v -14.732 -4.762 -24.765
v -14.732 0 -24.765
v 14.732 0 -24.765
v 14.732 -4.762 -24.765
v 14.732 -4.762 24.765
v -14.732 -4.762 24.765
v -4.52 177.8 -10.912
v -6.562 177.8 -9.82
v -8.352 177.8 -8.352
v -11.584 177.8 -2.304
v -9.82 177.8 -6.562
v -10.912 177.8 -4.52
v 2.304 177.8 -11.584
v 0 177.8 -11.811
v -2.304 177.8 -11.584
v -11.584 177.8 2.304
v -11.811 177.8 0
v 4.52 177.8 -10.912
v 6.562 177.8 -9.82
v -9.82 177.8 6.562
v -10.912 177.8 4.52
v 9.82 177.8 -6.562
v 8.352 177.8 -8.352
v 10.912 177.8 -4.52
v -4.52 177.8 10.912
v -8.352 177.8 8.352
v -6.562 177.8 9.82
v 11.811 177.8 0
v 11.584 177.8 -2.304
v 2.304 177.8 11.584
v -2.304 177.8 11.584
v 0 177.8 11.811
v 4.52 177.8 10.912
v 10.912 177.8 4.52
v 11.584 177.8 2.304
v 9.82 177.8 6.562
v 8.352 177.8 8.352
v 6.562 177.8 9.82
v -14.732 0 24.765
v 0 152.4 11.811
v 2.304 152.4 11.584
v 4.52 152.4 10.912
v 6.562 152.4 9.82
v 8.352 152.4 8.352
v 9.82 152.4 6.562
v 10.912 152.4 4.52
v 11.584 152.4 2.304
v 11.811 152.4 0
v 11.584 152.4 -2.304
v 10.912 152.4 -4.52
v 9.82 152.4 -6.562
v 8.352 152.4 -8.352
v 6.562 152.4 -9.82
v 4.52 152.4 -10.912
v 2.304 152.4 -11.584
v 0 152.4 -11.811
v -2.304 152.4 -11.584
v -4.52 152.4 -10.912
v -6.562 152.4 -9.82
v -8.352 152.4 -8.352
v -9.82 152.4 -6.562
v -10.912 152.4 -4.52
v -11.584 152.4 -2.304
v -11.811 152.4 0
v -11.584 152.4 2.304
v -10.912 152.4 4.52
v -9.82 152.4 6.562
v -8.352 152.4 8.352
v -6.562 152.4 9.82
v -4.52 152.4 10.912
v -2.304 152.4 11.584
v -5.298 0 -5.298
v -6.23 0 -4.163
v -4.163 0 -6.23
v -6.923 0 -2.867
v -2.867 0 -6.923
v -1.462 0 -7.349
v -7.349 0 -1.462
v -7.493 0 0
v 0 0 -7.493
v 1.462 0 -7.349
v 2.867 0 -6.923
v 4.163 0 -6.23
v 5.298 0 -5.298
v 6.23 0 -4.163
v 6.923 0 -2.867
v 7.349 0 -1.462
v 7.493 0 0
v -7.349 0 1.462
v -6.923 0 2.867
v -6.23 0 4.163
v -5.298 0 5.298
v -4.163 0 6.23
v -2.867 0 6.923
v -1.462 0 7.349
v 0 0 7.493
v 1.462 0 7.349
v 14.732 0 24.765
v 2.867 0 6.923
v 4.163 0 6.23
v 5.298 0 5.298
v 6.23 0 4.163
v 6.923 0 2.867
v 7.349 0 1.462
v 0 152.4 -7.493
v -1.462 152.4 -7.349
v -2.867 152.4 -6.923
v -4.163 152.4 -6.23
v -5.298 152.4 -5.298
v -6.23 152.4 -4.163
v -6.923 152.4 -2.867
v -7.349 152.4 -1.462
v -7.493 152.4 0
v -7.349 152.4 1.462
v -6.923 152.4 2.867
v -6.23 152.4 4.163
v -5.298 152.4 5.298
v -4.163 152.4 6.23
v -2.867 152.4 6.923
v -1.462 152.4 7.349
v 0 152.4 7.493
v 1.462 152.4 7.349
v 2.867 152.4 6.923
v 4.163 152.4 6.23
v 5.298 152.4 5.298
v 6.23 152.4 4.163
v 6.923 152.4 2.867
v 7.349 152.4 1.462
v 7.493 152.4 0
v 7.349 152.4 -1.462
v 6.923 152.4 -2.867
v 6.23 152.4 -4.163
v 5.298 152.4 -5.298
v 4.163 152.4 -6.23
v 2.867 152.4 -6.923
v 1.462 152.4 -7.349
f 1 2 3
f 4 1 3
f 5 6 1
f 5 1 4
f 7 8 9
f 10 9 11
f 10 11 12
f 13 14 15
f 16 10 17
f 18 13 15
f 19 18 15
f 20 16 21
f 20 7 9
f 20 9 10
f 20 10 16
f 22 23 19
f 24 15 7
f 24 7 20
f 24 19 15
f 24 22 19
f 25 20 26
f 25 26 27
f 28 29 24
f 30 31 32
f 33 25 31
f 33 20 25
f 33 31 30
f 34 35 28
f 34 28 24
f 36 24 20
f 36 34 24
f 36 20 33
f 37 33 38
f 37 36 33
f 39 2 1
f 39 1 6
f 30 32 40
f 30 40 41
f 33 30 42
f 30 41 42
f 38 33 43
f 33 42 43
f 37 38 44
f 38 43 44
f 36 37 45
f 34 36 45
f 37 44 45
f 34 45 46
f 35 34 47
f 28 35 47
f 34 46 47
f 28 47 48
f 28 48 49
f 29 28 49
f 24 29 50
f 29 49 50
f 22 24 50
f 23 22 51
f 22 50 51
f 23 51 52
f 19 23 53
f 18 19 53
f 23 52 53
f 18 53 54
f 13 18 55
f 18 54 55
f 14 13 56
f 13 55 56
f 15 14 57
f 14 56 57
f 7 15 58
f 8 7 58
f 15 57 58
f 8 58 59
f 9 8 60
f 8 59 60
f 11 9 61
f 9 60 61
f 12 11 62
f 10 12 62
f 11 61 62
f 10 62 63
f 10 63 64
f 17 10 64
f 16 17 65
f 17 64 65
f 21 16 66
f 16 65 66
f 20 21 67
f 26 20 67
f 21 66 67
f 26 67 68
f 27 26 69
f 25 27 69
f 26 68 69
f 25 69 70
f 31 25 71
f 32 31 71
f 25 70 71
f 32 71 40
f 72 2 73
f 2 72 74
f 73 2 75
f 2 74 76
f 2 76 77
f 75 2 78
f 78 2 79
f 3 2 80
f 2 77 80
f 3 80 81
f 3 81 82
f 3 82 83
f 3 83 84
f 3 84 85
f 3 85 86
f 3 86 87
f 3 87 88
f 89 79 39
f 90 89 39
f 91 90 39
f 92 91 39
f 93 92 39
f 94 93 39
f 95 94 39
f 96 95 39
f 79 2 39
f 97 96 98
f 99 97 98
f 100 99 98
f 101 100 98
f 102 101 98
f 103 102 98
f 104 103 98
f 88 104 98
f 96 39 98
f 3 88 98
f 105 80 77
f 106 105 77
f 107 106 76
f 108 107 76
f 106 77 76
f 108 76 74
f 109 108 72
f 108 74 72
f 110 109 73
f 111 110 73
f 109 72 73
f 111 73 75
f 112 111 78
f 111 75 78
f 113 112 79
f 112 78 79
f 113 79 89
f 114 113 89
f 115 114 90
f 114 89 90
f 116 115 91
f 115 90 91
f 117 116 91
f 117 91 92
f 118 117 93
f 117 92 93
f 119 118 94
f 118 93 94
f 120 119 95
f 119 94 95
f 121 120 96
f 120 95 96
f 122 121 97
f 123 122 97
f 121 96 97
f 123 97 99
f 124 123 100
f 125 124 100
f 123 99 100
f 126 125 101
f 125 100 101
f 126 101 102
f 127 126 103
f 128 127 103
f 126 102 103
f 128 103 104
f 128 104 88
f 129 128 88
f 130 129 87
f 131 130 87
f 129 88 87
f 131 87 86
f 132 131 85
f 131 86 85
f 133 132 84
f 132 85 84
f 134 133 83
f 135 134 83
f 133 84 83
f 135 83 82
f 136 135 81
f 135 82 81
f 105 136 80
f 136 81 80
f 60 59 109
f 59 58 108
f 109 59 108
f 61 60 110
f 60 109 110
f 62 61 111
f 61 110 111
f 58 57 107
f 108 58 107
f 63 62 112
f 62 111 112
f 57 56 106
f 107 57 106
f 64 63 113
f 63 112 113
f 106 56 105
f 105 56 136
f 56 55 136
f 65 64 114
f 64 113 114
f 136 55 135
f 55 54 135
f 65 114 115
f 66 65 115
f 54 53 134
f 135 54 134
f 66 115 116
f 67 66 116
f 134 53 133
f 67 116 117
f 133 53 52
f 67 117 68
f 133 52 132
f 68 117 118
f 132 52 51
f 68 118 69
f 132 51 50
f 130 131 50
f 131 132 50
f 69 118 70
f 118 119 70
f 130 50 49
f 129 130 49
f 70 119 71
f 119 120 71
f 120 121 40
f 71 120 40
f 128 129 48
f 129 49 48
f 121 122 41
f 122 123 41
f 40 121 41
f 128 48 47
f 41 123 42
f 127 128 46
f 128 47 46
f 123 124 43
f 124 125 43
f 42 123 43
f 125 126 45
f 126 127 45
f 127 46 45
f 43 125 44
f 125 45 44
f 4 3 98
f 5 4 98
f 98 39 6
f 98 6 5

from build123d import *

# Parameters (mm, degrees)
SKETCH1_R           = 7.493
BOSS_EXTRUDE1_DEPTH = 152.4
SKETCH2_W           = 29.464
SKETCH2_H           = 49.53
BOSS_EXTRUDE2_DEPTH = 4.7625
SKETCH3_R           = 11.811
BOSS_EXTRUDE3_DEPTH = 25.4


with BuildPart() as part:
    # Sketch1 → Boss-Extrude1 (new body)
    with BuildSketch(Plane(origin=(0, 0, 0), x_dir=(1, 0, 0), z_dir=(0, 1, 0))):
        with Locations(Location((0, 0, 0), (0, 0, 90))):
            Circle(SKETCH1_R)
    extrude(amount=BOSS_EXTRUDE1_DEPTH)

    # Sketch2 → Boss-Extrude2 (add)
    with BuildSketch(Plane.XZ):
        Rectangle(SKETCH2_W, SKETCH2_H)
    extrude(amount=BOSS_EXTRUDE2_DEPTH)

    # Sketch3 → Boss-Extrude3 (add)
    with BuildSketch(Plane(origin=(0, 152.4, 0), x_dir=(1, 0, 0), z_dir=(0, 1, 0))):
        with Locations(Location((0, 0, 0), (0, 0, 270))):
            Circle(SKETCH3_R)
    extrude(amount=BOSS_EXTRUDE3_DEPTH)


solid = part.part
